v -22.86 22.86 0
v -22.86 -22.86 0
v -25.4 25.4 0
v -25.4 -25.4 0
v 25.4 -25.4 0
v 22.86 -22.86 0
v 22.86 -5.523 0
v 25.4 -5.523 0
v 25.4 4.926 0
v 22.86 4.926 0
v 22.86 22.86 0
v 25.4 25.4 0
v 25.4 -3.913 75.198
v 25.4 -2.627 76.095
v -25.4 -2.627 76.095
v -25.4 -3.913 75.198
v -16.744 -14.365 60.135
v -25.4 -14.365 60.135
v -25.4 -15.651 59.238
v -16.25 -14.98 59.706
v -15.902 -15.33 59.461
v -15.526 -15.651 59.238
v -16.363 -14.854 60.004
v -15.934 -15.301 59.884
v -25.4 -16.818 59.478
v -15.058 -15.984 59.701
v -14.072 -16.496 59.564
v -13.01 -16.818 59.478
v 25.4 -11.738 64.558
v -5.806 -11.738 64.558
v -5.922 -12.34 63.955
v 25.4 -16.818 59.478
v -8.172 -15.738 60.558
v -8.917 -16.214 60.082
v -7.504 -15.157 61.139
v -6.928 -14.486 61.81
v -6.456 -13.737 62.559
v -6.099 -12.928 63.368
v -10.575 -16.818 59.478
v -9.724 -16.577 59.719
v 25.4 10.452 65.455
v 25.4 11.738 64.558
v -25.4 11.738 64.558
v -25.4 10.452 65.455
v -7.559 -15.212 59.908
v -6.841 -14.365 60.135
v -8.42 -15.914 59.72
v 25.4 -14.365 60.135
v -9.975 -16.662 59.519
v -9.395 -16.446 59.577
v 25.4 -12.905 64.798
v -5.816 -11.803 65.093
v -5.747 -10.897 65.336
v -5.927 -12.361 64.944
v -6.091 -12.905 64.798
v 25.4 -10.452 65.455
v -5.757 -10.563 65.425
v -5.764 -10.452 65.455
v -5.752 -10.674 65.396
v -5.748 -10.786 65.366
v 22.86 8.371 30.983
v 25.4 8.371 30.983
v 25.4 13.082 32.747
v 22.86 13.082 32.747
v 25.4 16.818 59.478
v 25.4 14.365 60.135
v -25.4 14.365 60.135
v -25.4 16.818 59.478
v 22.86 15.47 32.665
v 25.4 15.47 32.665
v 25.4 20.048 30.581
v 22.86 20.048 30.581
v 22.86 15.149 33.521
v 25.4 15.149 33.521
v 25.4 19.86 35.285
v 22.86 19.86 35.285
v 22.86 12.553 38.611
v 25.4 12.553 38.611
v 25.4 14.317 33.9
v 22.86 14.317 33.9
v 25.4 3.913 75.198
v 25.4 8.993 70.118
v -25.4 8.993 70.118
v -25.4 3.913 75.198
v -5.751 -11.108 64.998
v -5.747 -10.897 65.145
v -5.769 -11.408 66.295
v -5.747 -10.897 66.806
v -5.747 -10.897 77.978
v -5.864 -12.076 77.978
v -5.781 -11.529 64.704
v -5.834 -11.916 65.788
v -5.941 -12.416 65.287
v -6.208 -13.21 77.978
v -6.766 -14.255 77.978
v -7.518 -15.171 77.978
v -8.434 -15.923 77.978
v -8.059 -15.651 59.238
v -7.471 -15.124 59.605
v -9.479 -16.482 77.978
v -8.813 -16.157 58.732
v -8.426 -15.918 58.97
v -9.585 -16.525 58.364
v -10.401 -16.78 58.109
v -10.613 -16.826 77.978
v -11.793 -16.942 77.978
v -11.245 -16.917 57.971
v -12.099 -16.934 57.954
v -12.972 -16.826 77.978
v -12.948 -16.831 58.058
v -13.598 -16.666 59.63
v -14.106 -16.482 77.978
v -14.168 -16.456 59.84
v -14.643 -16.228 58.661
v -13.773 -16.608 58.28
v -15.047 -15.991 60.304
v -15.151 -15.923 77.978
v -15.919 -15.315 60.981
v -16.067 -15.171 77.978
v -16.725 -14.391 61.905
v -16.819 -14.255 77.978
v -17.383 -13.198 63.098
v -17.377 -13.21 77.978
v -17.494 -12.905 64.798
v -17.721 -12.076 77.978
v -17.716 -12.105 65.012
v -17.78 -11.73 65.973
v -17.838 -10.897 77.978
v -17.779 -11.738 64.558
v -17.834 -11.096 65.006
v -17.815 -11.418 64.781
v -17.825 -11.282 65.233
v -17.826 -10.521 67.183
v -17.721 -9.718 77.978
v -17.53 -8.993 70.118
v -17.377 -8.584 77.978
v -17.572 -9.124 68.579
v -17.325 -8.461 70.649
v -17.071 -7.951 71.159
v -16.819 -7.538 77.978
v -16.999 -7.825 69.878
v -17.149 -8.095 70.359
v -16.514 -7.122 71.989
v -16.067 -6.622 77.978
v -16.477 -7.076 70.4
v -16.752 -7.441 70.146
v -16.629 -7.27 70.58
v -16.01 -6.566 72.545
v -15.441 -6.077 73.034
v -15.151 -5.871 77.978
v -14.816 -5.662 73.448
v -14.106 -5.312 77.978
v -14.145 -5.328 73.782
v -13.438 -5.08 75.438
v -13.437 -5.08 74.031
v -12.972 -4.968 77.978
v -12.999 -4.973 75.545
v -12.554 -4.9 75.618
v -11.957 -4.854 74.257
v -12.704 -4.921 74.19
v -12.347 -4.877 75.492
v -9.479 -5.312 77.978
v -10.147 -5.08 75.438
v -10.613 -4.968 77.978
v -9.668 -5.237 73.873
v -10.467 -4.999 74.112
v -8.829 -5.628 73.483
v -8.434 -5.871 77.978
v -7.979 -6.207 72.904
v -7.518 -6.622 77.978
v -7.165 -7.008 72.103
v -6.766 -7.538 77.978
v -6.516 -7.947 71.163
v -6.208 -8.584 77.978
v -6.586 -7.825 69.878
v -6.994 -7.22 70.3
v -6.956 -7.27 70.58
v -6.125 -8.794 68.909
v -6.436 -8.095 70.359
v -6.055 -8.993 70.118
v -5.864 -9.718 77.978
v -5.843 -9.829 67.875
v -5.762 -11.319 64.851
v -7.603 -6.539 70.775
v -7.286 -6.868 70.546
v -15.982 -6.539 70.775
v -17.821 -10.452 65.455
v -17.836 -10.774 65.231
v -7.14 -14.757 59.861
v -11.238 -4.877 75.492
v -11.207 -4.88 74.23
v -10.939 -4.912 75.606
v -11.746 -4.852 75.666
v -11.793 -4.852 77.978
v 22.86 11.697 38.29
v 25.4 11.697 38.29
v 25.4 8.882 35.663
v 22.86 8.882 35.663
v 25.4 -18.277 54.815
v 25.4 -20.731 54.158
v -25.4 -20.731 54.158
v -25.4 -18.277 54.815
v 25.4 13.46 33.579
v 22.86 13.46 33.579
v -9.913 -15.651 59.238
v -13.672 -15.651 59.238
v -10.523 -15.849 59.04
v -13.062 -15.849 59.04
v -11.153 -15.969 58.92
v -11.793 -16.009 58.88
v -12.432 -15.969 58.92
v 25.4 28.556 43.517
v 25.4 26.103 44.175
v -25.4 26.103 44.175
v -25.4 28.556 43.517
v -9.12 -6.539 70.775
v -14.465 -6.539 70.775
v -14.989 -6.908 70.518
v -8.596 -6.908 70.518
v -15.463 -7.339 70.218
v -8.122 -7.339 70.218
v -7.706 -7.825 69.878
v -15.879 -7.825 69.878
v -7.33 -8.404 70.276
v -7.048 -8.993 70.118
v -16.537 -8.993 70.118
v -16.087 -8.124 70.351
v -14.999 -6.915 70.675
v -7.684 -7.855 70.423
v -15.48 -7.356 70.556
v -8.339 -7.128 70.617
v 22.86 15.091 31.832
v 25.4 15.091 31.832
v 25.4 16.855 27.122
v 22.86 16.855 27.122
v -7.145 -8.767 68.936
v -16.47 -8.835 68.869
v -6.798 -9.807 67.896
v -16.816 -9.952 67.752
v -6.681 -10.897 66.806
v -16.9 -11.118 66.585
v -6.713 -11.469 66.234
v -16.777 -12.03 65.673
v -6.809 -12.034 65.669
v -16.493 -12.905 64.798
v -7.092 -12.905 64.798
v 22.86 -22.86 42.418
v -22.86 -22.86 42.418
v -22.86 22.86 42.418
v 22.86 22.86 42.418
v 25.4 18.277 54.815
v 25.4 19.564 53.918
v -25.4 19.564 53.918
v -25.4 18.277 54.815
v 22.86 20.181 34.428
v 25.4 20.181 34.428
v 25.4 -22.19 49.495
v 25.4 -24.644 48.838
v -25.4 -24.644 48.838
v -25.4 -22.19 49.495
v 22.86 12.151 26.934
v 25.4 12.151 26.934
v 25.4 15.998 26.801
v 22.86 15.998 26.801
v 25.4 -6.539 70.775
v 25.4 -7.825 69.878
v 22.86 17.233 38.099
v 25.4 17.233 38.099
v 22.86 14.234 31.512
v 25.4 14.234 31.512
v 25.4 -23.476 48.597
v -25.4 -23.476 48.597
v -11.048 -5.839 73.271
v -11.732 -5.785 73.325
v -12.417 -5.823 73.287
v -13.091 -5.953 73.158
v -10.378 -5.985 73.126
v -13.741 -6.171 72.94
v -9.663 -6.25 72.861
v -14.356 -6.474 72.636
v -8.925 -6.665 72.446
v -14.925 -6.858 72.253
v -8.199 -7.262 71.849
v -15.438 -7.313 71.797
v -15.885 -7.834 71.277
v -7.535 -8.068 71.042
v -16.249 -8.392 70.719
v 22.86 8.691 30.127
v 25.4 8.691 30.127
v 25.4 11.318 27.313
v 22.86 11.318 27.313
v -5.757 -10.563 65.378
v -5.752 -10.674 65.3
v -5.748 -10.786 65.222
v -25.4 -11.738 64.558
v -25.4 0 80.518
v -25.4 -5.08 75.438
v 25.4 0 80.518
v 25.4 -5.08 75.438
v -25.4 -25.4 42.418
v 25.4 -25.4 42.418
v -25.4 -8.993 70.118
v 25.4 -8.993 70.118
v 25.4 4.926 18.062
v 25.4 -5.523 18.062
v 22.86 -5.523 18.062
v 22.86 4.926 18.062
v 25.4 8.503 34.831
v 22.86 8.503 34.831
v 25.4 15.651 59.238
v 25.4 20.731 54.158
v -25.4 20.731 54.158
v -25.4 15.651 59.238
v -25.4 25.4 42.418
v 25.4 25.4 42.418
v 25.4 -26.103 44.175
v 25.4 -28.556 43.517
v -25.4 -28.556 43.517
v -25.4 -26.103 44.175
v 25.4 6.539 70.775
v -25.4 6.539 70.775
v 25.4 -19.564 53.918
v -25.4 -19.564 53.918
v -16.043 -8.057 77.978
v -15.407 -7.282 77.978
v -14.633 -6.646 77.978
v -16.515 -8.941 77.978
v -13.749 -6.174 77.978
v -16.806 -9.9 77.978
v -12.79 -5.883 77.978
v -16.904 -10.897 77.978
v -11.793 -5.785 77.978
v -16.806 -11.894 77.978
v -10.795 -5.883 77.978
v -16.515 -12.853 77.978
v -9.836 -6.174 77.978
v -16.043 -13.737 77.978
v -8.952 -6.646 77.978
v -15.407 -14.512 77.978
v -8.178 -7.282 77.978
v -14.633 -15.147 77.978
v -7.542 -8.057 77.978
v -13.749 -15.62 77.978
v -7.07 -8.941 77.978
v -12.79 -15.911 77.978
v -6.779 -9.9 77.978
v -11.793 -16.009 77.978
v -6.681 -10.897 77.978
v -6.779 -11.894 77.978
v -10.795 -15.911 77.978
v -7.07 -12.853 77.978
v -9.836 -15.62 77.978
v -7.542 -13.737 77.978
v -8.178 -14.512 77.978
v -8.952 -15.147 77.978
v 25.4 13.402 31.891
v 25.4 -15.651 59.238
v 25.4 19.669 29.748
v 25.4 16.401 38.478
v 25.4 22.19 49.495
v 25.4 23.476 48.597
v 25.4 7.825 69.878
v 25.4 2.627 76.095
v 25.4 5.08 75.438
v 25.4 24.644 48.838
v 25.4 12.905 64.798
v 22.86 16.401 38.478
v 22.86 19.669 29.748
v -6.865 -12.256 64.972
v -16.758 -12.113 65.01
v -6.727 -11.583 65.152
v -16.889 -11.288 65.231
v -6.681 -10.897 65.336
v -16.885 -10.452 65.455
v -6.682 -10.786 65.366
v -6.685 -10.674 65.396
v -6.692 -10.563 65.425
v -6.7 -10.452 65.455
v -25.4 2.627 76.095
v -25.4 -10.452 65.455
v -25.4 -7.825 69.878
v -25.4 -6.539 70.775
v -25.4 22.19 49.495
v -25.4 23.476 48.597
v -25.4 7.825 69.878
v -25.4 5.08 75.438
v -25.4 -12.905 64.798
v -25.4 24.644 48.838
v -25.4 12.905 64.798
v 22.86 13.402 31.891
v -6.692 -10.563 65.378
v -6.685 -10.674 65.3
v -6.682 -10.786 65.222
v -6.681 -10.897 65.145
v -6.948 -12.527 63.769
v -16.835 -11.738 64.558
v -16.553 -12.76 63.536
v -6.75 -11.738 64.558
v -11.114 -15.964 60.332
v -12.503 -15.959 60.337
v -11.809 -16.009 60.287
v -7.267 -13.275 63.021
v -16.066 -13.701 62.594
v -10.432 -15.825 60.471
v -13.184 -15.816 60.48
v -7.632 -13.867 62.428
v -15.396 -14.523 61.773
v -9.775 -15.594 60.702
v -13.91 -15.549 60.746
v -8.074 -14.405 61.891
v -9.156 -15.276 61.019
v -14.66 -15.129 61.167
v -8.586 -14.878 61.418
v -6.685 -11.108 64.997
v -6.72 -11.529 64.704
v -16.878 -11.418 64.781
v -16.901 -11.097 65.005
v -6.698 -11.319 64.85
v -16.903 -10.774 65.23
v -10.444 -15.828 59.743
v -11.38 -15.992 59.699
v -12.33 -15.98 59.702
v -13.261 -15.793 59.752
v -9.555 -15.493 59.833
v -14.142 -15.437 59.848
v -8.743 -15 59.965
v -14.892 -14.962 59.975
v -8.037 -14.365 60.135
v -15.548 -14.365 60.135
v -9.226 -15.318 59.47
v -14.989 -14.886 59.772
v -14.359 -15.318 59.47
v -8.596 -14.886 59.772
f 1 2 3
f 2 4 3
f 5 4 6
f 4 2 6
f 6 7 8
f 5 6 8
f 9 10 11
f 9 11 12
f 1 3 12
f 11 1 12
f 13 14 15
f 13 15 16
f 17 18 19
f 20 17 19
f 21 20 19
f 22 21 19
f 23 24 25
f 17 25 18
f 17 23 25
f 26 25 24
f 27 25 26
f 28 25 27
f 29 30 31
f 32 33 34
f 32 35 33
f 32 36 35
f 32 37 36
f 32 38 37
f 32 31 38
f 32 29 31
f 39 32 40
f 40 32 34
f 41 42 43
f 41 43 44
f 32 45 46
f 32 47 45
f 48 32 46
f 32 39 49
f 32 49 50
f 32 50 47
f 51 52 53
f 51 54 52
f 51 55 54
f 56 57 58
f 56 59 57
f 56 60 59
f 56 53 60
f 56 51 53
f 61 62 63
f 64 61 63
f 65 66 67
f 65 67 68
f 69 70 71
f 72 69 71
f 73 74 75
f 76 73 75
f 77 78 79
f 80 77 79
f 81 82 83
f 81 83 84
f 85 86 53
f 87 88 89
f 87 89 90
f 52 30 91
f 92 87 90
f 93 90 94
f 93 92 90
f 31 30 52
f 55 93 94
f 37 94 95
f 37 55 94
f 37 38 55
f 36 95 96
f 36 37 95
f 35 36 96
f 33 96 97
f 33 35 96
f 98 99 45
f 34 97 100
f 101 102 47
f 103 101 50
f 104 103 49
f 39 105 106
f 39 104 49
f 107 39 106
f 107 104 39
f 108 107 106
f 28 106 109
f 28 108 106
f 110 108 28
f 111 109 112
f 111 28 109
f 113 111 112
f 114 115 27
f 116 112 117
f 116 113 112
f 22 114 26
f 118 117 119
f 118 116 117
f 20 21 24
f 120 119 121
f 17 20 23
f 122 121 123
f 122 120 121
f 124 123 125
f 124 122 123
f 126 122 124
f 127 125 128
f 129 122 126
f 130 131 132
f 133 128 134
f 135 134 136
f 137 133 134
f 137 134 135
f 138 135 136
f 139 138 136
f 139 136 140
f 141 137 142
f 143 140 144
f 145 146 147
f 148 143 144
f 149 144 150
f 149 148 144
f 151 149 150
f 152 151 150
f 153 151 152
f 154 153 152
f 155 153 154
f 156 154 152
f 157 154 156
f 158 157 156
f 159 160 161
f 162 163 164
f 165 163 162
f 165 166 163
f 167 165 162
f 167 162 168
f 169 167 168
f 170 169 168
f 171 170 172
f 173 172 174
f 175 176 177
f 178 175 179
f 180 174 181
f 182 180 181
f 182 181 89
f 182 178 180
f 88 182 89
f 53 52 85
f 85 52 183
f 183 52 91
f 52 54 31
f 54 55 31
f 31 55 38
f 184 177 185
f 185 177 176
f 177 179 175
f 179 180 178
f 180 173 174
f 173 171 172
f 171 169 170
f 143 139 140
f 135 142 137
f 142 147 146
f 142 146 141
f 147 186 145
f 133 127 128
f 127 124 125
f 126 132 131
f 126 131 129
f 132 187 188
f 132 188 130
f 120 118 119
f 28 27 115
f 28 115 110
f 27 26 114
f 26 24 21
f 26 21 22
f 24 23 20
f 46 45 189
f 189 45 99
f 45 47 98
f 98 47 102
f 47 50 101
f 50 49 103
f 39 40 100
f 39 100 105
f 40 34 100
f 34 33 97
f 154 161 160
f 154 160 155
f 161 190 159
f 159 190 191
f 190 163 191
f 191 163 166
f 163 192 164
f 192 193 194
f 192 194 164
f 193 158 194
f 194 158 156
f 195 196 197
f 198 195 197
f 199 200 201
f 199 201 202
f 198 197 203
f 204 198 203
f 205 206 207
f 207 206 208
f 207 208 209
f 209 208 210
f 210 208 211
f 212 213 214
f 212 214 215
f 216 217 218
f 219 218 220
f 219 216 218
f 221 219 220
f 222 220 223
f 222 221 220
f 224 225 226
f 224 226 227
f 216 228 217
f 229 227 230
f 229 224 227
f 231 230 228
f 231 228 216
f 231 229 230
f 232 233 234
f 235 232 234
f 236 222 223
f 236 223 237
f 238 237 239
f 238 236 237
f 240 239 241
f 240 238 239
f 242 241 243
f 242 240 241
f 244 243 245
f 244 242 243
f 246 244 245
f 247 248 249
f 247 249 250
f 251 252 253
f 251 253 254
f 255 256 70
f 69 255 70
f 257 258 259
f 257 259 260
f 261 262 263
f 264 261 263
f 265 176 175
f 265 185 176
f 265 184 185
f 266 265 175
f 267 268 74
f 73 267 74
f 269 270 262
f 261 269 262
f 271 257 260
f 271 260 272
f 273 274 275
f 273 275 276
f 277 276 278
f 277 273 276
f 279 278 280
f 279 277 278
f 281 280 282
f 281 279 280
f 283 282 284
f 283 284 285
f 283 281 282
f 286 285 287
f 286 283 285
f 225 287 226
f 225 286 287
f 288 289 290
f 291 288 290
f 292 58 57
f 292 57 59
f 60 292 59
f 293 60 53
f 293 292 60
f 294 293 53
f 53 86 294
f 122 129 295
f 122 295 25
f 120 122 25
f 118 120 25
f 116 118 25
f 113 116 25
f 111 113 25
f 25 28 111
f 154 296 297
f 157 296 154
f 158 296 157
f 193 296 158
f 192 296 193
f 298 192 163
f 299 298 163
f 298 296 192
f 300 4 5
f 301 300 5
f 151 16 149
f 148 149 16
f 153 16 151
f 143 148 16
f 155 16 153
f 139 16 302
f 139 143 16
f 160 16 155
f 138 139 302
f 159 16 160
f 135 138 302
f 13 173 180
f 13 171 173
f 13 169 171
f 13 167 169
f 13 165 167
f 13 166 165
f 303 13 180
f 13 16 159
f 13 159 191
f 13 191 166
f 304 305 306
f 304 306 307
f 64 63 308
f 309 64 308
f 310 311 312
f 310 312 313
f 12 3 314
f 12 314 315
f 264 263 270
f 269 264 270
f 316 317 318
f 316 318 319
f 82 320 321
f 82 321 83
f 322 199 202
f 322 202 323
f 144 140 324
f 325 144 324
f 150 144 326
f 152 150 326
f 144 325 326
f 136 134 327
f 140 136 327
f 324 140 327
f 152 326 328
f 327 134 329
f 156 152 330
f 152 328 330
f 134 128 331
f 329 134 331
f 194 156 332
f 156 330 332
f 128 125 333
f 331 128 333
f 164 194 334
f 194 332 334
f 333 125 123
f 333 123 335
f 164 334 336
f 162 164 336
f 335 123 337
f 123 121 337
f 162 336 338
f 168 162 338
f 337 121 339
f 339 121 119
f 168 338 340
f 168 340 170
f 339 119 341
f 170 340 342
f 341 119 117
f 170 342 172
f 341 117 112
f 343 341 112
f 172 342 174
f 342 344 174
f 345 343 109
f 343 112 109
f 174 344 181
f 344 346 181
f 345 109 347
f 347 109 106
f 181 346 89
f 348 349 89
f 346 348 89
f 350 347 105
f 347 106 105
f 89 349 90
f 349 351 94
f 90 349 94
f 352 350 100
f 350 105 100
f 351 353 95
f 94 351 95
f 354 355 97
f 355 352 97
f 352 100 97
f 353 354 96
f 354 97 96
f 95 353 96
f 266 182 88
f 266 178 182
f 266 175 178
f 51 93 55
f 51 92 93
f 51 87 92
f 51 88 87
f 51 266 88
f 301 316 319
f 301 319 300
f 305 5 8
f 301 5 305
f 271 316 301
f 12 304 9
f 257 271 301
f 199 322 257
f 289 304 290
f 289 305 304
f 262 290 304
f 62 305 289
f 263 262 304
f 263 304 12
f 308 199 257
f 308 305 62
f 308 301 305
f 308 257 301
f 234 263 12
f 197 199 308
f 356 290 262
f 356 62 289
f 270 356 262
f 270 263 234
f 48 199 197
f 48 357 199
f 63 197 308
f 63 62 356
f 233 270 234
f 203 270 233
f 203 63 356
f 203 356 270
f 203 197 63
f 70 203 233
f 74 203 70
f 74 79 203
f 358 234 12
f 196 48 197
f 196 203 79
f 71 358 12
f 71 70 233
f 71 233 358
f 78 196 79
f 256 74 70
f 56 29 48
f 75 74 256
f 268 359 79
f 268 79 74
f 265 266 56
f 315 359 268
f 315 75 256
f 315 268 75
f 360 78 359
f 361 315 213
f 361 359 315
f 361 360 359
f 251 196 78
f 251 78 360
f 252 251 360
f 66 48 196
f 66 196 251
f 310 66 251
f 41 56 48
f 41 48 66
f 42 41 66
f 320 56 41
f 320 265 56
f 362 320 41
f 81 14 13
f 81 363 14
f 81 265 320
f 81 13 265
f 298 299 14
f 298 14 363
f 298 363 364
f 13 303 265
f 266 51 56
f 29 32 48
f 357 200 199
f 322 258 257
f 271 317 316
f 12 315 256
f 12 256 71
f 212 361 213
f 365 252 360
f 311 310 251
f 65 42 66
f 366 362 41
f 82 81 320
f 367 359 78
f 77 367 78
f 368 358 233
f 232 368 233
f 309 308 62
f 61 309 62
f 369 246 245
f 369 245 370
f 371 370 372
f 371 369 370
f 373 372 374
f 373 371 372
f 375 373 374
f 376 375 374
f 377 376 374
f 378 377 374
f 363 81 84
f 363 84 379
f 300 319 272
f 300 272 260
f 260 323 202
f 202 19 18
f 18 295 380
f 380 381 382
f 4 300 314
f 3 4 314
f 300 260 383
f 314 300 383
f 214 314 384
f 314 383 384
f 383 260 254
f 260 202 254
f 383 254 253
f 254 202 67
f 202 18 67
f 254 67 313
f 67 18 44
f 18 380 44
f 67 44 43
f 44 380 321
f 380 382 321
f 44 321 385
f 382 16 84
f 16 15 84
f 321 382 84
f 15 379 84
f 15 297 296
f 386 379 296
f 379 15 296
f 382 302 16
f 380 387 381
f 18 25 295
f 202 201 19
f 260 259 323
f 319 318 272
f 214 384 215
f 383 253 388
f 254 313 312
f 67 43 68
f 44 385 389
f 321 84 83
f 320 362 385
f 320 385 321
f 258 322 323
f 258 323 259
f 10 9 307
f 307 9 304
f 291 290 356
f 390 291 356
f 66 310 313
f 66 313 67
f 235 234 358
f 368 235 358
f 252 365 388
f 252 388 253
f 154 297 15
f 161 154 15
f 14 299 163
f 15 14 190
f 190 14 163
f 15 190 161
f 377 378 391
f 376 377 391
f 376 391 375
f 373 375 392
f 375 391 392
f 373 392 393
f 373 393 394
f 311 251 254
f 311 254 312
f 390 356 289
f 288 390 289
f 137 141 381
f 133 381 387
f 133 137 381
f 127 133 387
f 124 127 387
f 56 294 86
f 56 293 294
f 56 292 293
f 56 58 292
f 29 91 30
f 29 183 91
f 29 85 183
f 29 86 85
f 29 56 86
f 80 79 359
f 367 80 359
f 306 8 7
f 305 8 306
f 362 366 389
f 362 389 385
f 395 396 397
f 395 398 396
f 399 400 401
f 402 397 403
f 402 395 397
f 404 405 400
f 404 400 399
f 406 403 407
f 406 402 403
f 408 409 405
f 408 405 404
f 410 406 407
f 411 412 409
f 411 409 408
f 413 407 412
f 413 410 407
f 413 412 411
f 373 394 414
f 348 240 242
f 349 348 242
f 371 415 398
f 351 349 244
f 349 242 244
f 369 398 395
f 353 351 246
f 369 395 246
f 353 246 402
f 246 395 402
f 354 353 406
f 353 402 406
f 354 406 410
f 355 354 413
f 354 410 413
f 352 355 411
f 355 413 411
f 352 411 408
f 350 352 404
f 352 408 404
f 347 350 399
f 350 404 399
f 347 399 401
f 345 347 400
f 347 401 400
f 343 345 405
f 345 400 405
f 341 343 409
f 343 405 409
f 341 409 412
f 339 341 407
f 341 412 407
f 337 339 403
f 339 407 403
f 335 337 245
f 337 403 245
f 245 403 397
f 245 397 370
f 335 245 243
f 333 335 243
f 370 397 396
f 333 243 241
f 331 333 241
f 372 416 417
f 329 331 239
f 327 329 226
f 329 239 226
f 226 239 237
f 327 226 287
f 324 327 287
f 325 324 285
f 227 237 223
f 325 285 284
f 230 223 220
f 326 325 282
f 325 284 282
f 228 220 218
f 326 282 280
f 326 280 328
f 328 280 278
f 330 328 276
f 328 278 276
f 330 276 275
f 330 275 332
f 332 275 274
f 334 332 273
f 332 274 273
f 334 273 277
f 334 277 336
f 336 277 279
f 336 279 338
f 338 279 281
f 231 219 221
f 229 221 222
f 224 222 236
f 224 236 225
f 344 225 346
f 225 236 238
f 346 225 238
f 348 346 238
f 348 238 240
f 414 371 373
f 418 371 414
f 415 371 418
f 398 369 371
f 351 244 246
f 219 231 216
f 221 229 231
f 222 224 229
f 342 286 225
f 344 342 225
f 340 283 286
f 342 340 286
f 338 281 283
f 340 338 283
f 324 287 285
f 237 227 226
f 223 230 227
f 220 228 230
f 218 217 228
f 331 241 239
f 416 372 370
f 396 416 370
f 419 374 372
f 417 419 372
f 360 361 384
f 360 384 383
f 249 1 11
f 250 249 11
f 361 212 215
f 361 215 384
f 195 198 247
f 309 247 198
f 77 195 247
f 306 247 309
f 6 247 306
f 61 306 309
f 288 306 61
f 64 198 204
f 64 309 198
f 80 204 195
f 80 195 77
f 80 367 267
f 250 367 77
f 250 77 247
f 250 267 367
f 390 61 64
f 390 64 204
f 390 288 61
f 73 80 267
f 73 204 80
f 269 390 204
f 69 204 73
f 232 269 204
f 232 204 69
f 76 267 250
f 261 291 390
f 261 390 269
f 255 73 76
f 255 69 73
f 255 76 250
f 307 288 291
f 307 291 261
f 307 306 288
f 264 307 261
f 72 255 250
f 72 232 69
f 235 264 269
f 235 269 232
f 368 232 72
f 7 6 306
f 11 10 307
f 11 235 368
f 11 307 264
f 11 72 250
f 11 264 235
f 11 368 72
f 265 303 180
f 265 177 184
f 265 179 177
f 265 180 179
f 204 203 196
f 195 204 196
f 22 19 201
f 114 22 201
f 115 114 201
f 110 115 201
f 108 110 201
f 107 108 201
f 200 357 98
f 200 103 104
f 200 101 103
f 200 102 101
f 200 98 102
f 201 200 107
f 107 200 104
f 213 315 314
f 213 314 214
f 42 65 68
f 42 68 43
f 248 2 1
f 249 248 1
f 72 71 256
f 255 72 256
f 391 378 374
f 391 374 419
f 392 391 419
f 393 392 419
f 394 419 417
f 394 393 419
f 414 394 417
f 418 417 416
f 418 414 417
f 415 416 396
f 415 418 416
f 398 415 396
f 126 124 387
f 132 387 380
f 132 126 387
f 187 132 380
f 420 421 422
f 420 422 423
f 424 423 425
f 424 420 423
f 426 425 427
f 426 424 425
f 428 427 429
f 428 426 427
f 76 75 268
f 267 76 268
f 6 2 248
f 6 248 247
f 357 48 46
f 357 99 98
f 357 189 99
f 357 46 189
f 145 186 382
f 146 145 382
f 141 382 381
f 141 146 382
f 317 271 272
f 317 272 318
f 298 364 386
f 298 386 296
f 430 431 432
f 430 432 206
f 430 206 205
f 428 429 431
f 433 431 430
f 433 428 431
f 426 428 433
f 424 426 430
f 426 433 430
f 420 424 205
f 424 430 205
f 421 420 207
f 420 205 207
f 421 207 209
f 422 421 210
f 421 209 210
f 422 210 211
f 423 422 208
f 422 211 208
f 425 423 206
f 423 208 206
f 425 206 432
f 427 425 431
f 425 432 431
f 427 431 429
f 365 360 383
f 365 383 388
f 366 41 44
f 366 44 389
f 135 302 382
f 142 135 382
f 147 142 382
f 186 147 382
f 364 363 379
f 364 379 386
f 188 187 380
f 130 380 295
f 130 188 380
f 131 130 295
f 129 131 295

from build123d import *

# Parameters (mm, degrees)
F0_W     = 50.8
F0_H     = 50.8
F0_W_2   = 45.72
F0_H_2   = 45.72
F1_DEPTH = 42.418
F2_W     = 10.449068
F2_H     = 18.06196
F3_DEPTH = 33.02
F5_DEPTH = 50.8
F6_R     = 6.04507
F6_R_2   = 5.111914
F7_DEPTH = 35.56
F9_DEPTH = 25.4


with BuildPart() as f1:
    # F0 (on Top) → F1 (new body)
    with BuildSketch(Plane.XY):
        Rectangle(F0_W, F0_H)
        Rectangle(F0_W_2, F0_H_2, mode=Mode.SUBTRACT)
    extrude(amount=F1_DEPTH)

    # F2 (on face) → F3 (cut)
    with BuildSketch(Plane.YZ.offset(25.4)):
        with Locations((-0.298544, 9.03098)):
            Rectangle(F2_W, F2_H)
    extrude(amount=-F3_DEPTH, mode=Mode.SUBTRACT)

    # F4 (on face) → F5 (join)
    with BuildSketch(Plane.YZ.offset(25.4)):
        Polygon((5.08, 75.438), (0, 80.518), (-5.08, 75.438), (-2.626548, 76.0954), (-3.912723, 75.197905), (-8.992723, 70.117905), (-6.539271, 70.775305), (-7.825446, 69.877809), (-12.905446, 64.797809), (-10.451994, 65.455209), (-11.738169, 64.557714), (-16.818169, 59.477714), (-14.364717, 60.135114), (-15.650891, 59.237618), (-20.730891, 54.157618), (-18.27744, 54.815018), (-19.563614, 53.917523), (-24.643614, 48.837523), (-22.190163, 49.494923), (-23.476337, 48.597427), (-28.556337, 43.517427), (-26.102885, 44.174827), (-25.4, 42.418), (25.4, 42.418), (26.102885, 44.174827), (28.556337, 43.517427), (23.476337, 48.597427), (22.190163, 49.494923), (24.643614, 48.837523), (19.563614, 53.917523), (18.27744, 54.815018), (20.730891, 54.157618), (15.650891, 59.237618), (14.364717, 60.135114), (16.818169, 59.477714), (11.738169, 64.557714), (10.451994, 65.455209), (12.905446, 64.797809), (7.825446, 69.877809), (6.539271, 70.775305), (8.992723, 70.117905), (3.912723, 75.197905), (2.626548, 76.0954), align=None)
    extrude(amount=-F5_DEPTH)

    # F6 (on face) → F7 (join)
    with BuildSketch(Plane(origin=(0, 0, 42.418), x_dir=(1, 0, 0), z_dir=(0, 0, -1))):
        with Locations((-11.792519, 10.896885)):
            Circle(F6_R)
        with Locations((-11.792519, 10.896885)):
            Circle(F6_R_2, mode=Mode.SUBTRACT)
    extrude(amount=-F7_DEPTH)

    # F8 (on face) → F9 (cut)
    with BuildSketch(Plane.YZ.offset(25.4)):
        Polygon((13.460486, 33.579258), (11.696823, 38.290104), (8.882317, 35.663231), align=None)
        Polygon((14.316839, 33.899863), (16.400811, 38.478032), (12.553176, 38.610708), align=None)
        Polygon((15.149074, 33.521031), (19.859919, 35.284695), (17.233046, 38.0992), align=None)
        Polygon((13.081654, 32.747024), (8.503485, 34.830996), (8.370809, 30.98336), align=None)
        Polygon((13.402259, 31.89067), (8.691413, 30.127007), (11.318286, 27.312501), align=None)
        Polygon((14.234494, 31.511839), (12.150521, 26.93367), (15.998157, 26.800994), align=None)
        Polygon((15.090847, 31.832444), (16.85451, 27.121598), (19.669016, 29.748471), align=None)
        Polygon((15.469678, 32.664678), (20.047847, 30.580706), (20.180524, 34.428342), align=None)
    extrude(amount=-F9_DEPTH, mode=Mode.SUBTRACT)


solid = f1.part
